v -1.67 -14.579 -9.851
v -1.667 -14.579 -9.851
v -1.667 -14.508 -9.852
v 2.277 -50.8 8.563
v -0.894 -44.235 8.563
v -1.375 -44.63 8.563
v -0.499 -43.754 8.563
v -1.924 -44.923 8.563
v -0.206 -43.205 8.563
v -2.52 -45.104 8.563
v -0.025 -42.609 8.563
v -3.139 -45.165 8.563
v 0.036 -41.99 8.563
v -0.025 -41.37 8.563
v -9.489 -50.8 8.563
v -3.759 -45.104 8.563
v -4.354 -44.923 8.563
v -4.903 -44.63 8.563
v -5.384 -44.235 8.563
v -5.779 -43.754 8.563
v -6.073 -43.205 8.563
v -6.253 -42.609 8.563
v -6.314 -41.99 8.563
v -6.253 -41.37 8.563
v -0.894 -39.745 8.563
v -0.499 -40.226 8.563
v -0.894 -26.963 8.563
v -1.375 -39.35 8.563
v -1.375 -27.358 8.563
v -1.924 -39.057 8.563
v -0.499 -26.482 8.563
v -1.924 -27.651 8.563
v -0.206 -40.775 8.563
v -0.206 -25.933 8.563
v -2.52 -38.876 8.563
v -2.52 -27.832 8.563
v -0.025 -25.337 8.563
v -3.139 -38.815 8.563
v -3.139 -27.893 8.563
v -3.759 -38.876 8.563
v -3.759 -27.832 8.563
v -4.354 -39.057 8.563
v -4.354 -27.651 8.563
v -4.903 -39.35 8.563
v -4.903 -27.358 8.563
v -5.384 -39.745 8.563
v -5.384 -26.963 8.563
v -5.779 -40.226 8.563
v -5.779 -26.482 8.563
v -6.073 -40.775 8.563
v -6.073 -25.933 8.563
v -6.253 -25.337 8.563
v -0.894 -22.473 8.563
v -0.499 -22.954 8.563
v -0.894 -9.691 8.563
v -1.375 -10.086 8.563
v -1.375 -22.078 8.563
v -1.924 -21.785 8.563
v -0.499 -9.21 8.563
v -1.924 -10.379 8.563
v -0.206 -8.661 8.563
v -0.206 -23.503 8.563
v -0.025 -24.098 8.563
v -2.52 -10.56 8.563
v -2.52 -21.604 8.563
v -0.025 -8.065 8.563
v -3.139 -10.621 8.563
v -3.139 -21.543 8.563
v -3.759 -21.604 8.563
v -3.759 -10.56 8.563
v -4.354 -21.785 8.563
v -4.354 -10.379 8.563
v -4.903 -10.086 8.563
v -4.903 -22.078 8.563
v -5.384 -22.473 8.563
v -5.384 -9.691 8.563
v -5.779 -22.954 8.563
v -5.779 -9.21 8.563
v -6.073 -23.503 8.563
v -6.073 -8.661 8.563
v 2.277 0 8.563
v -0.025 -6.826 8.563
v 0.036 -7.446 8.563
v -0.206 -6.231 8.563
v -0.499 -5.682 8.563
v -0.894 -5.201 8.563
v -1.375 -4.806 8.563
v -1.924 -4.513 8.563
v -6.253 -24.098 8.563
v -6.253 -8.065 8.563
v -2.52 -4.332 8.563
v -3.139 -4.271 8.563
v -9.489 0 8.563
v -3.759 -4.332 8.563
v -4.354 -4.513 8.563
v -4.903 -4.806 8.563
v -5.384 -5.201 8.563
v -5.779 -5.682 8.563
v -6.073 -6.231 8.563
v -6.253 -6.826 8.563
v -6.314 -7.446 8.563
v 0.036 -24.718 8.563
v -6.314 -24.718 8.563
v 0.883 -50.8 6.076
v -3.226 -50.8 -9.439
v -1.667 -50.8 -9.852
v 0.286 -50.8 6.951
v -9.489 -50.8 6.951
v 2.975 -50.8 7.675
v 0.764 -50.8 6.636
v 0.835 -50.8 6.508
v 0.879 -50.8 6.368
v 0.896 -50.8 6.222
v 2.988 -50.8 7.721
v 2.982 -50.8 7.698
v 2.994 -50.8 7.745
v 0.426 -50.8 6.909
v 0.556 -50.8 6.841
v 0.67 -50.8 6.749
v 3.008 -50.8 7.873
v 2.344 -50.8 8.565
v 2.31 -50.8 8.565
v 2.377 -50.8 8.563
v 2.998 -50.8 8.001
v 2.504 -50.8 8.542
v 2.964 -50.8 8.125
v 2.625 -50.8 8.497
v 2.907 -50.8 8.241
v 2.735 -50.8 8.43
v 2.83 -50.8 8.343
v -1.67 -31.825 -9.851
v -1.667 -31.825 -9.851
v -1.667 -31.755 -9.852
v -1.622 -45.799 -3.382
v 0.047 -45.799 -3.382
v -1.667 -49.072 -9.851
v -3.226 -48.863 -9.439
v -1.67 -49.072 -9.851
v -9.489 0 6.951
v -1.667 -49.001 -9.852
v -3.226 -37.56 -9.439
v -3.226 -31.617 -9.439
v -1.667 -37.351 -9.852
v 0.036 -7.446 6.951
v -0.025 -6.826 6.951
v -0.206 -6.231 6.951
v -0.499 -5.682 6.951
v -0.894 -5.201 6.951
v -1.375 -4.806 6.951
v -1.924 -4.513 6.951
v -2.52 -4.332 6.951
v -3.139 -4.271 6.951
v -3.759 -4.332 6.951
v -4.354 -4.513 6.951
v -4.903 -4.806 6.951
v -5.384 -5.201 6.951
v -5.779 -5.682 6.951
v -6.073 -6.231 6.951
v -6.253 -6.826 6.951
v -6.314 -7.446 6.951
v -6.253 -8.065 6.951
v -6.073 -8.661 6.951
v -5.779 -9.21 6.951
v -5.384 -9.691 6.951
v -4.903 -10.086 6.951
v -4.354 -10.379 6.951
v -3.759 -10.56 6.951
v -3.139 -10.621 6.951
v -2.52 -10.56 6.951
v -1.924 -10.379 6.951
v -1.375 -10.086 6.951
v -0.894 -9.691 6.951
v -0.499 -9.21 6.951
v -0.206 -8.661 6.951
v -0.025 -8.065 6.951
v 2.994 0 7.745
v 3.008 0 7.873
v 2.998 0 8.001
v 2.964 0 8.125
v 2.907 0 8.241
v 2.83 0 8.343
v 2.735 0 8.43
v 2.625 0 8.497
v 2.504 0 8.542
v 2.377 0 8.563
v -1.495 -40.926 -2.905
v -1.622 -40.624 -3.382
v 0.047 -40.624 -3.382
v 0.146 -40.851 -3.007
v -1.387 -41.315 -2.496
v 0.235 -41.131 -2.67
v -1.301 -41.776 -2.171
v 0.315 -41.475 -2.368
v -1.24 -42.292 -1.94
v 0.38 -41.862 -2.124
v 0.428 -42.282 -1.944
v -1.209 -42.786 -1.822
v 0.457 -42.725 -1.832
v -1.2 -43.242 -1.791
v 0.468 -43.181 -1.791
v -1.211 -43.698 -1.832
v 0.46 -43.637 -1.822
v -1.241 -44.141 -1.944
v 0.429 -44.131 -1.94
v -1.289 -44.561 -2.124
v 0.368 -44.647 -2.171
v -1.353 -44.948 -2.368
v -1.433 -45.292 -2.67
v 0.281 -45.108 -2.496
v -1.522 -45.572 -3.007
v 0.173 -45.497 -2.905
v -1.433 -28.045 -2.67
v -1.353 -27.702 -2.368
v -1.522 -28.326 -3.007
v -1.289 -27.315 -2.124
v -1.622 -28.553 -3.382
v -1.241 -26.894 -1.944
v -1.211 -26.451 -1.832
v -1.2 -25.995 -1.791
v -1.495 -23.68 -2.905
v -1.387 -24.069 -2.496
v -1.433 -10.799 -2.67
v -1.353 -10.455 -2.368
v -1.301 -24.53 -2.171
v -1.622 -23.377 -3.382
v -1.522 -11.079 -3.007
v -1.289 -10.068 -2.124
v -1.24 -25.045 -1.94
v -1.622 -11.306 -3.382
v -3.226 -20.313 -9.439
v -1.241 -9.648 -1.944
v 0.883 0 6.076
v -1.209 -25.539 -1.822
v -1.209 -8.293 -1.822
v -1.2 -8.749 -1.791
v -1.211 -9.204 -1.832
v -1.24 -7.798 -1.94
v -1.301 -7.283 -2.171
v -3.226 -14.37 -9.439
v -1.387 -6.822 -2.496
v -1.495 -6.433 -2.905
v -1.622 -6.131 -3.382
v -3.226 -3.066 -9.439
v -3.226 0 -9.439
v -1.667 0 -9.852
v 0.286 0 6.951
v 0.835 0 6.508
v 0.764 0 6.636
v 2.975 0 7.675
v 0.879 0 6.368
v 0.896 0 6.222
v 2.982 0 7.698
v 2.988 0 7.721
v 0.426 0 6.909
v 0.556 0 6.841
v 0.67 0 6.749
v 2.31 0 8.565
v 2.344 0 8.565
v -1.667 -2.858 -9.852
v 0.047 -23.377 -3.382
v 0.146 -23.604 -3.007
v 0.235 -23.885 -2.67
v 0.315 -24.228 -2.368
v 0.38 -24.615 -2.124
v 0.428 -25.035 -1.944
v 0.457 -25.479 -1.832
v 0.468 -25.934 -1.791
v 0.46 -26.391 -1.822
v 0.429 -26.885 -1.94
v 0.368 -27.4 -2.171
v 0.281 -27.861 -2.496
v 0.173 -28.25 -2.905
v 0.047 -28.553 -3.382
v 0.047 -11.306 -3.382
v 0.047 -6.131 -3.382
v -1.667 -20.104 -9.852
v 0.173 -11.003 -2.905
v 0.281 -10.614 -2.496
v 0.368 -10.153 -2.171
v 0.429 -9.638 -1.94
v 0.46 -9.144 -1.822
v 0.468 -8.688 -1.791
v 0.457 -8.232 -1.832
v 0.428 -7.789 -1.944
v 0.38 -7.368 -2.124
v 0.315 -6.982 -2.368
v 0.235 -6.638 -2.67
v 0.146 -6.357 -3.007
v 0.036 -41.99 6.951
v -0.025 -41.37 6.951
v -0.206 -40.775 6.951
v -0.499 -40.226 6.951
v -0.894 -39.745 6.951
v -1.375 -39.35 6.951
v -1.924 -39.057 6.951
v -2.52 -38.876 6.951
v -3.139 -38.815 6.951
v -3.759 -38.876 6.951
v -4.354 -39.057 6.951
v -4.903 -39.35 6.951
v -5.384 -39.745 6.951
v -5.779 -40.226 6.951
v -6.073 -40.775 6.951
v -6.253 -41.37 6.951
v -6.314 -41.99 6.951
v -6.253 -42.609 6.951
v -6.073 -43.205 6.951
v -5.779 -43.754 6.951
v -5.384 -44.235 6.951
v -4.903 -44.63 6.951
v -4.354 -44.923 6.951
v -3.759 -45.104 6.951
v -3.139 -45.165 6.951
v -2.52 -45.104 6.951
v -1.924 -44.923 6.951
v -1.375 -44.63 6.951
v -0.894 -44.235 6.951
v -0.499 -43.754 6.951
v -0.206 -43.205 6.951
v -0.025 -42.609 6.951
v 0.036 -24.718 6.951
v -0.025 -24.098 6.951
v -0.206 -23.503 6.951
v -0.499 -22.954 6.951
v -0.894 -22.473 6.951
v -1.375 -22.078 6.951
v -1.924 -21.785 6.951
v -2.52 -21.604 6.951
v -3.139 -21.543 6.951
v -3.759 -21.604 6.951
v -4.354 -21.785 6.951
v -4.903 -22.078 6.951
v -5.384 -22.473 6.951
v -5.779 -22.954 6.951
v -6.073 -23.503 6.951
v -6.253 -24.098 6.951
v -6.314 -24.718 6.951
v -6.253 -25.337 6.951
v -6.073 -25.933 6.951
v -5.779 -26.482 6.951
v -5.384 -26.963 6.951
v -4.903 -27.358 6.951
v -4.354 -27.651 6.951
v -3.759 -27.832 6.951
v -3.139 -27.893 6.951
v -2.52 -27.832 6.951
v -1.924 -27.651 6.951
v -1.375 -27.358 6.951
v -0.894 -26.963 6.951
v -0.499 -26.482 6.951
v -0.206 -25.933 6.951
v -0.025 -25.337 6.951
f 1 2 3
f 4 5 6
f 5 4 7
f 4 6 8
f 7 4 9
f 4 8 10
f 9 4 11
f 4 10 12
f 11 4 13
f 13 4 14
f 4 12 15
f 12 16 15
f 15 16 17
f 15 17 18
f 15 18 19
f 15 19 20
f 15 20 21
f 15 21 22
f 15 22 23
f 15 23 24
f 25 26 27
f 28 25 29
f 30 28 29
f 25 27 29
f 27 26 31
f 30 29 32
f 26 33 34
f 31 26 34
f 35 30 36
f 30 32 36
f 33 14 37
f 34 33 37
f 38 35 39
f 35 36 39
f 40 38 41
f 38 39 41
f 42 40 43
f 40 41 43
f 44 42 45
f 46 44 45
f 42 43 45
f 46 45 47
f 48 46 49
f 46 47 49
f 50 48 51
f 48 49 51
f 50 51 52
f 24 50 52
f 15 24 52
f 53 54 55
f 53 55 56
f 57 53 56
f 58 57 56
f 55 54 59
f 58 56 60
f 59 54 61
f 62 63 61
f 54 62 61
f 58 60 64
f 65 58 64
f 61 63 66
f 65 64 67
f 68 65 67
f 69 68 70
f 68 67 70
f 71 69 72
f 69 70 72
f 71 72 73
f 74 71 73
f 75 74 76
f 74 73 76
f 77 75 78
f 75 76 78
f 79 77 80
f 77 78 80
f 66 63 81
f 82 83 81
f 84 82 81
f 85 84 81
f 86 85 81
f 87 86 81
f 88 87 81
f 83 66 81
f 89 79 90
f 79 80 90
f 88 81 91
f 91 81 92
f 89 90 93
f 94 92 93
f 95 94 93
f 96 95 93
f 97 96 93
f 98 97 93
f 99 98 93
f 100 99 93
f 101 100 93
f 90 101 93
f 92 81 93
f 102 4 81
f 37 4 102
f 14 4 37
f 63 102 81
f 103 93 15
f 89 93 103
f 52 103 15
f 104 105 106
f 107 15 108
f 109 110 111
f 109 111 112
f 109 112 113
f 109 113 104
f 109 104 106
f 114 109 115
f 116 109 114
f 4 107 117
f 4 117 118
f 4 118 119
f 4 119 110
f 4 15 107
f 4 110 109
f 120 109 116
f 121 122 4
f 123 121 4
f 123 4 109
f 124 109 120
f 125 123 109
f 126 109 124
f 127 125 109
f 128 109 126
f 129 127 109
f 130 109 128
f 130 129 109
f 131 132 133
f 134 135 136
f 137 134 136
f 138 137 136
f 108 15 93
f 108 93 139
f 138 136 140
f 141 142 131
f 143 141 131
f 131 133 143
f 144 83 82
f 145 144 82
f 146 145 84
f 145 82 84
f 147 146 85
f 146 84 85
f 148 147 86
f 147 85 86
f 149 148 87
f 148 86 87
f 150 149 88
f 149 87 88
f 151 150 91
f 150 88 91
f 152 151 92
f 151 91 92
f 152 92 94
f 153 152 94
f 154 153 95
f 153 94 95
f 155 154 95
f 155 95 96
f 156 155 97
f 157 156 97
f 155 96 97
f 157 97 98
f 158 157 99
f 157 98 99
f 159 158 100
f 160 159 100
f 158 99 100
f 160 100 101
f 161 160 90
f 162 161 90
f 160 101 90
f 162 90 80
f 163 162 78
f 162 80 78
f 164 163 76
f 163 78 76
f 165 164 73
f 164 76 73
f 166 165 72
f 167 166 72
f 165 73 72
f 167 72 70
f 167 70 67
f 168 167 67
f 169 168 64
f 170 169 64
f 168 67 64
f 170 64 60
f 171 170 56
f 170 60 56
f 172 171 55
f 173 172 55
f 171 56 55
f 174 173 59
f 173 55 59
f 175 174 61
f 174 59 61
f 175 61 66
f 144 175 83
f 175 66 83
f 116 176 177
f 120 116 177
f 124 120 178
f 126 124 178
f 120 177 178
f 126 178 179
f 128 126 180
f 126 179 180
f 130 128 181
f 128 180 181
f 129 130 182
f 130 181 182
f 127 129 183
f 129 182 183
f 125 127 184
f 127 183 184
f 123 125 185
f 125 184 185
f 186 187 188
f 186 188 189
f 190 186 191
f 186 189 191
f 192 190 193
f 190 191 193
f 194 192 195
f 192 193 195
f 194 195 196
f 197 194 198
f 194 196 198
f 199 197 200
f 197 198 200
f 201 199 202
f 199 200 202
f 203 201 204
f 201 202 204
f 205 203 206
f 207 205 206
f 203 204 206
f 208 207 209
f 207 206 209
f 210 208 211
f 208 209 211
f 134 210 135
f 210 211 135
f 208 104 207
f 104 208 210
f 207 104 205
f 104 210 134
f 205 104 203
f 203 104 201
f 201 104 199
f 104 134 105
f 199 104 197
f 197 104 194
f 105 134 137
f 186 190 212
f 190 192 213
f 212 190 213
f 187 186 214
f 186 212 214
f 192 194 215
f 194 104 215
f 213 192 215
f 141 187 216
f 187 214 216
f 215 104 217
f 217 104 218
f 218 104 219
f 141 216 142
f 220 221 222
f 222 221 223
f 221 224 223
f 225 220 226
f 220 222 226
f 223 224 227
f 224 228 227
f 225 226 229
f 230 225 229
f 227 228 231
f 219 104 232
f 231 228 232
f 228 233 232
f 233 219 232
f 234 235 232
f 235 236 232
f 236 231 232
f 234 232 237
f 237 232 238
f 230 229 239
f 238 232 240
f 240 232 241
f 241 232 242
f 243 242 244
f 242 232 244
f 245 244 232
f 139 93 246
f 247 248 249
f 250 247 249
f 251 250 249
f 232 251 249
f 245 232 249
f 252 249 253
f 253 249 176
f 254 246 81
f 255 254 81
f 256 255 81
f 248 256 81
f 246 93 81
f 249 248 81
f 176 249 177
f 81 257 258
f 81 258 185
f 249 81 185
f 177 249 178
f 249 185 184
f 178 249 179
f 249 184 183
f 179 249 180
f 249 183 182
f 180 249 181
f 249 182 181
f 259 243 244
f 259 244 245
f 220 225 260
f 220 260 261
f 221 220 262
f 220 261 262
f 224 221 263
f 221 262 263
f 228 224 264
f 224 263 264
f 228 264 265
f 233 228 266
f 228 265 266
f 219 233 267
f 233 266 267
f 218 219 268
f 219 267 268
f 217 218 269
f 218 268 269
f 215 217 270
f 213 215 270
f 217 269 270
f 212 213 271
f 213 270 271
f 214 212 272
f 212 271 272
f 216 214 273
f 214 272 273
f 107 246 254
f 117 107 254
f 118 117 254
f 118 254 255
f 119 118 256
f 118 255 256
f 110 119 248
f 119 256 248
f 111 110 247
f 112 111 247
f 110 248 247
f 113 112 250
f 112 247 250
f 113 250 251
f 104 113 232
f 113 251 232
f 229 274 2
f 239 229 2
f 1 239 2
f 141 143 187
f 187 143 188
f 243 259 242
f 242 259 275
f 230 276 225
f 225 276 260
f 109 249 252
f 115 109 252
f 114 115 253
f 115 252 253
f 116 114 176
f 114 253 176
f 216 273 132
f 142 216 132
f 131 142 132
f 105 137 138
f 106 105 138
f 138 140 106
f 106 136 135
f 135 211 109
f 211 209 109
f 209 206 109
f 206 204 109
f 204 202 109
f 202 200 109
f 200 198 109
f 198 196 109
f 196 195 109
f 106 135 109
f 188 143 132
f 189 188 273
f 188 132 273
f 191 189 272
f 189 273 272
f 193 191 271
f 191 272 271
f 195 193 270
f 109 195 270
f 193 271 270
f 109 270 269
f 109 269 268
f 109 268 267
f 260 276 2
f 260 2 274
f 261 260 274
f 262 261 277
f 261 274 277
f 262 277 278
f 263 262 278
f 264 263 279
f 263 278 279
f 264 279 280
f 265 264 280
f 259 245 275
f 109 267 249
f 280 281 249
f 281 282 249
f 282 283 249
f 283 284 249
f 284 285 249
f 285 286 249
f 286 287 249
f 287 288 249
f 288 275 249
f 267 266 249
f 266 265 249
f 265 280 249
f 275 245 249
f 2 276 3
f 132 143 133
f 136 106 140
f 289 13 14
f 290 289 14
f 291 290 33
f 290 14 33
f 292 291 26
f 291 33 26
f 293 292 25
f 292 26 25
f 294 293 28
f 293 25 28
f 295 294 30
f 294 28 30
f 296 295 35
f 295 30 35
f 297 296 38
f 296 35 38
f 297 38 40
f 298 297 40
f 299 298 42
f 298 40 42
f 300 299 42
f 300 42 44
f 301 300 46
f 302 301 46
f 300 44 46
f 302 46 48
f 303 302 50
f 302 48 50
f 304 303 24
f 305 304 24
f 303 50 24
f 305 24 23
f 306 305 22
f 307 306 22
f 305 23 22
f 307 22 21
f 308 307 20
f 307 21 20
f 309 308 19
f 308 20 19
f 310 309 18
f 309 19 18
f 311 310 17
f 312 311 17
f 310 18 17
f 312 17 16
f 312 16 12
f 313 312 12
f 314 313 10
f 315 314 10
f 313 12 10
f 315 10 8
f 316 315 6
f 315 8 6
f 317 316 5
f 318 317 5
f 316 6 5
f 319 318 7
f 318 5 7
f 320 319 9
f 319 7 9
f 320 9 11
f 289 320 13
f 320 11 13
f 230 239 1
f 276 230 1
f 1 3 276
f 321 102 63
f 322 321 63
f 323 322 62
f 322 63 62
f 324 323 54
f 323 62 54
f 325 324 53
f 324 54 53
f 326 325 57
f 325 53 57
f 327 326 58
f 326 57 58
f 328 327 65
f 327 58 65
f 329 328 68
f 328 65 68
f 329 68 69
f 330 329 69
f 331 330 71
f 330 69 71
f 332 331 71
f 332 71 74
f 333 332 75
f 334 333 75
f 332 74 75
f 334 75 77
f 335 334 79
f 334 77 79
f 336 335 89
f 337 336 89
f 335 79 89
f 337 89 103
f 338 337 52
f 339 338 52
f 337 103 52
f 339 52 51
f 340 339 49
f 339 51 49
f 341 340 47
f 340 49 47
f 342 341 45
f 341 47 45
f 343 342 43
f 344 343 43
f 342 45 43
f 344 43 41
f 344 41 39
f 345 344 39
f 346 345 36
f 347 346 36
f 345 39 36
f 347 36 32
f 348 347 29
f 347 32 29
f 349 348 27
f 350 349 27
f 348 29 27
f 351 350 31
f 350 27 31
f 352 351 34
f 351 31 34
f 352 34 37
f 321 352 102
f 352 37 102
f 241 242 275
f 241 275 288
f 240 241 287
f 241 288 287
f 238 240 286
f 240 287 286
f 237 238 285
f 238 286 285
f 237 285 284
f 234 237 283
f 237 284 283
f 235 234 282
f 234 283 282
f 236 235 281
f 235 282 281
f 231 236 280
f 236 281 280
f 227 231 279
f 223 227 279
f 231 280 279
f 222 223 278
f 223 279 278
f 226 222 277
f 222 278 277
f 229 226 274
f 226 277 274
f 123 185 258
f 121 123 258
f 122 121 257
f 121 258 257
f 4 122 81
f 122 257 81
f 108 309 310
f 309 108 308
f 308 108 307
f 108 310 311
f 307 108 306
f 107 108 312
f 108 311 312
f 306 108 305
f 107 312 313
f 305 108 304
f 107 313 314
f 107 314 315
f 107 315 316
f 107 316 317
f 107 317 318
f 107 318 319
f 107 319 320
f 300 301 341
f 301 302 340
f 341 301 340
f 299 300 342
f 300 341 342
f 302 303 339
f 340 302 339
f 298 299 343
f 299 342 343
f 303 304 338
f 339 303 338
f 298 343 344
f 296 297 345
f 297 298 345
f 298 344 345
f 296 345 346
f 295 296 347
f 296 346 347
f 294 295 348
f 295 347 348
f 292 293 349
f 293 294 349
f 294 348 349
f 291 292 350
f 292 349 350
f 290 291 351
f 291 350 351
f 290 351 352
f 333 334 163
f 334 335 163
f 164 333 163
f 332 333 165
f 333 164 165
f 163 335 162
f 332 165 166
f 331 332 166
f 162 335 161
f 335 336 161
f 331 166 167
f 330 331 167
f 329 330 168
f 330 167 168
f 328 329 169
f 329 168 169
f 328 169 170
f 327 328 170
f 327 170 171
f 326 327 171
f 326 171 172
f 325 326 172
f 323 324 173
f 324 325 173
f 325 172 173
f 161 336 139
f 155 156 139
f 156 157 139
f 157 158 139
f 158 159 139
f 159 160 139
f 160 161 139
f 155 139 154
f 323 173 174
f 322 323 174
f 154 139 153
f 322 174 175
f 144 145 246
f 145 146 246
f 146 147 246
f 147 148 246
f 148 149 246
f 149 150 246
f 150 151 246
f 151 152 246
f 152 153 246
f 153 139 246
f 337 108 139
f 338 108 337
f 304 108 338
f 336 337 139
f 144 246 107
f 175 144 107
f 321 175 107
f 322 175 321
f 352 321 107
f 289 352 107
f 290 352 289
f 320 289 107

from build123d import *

# Parameters (mm, degrees)
F1_DEPTH      = 50.8
F3_DEPTH      = 25.4
F3_DEPTH_BACK = 25.4
F4_R          = 3.175
F5_DEPTH      = 1.6129


with BuildPart() as f1:
    # F0 (on Front) → F1 (new body)
    with BuildSketch(Plane.XZ):
        with BuildLine():
            Line((2.2765197791, 8.5634865664), (-9.489294471, 8.5634865664))
            Line((-9.489294471, 8.5634865664), (-9.489294471, 6.9505865664))
            Line((-9.489294471, 6.9505865664), (0, 6.9505865664))
            ThreePointArc((0, 6.9505865664), (0.1429068283, 6.9642762789), (0.2858136566, 6.9505865664))
            ThreePointArc((0.2858136566, 6.9505865664), (0.7644025503, 6.6362301957), (0.8833758177, 6.0761296524))
            Line((0.8833758177, 6.0761296524), (-3.2259208163, -9.4385629753))
            Line((-3.2259208163, -9.4385629753), (-1.6667832808, -9.8515236945))
            Line((-1.6667832808, -9.8515236945), (2.9753029463, 7.6747216416))
            Line((2.9753029463, 7.6747216416), (2.993829025, 7.7446670463))
            ThreePointArc((2.993829025, 7.7446670463), (2.8710717472, 8.2939064661), (2.3770475991, 8.5634865664))
            Line((2.3770475991, 8.5634865664), (2.2765197791, 8.5634865664))
        make_face()
        with BuildLine():
            ThreePointArc((2.3770475991, 8.5634865664), (2.3267836891, 8.5653429014), (2.2765197791, 8.5634865664))
            Line((2.2765197791, 8.5634865664), (2.3770475991, 8.5634865664))
        make_face()
        with BuildLine():
            ThreePointArc((0.2858136566, 6.9505865664), (0.1429068283, 6.9642762789), (0, 6.9505865664))
            Line((0, 6.9505865664), (0.2858136566, 6.9505865664))
        make_face()
        with BuildLine():
            ThreePointArc((2.9753029463, 7.6747216416), (2.9854950368, 7.709448271), (2.993829025, 7.7446670463))
            Line((2.993829025, 7.7446670463), (2.9753029463, 7.6747216416))
        make_face()
    extrude(amount=F1_DEPTH)

    # F2 (on Right) → F3 (cut, two sides)
    with BuildSketch(Plane.YZ) as f3_sk:
        with BuildLine():
            Line((-45.7992069423, -3.3815500792), (-49.0718819201, -9.8507925868))
            Line((-49.0718819201, -9.8507925868), (-37.2894648818, -9.9727063475))
            Line((-37.2894648818, -9.9727063475), (-40.6238138676, -3.3815500792))
            ThreePointArc((-40.6238138676, -3.3815500792), (-43.2115104049, -1.7906479393), (-45.7992069423, -3.3815500792))
        make_face()
        with BuildLine():
            Line((-20.0428648818, -9.9727063475), (-23.3772138676, -3.3815500792))
            ThreePointArc((-23.3772138676, -3.3815500792), (-25.9649104049, -1.7906479393), (-28.5526069423, -3.3815500792))
            Line((-28.5526069423, -3.3815500792), (-31.8252819201, -9.8507925868))
            Line((-31.8252819201, -9.8507925868), (-20.0428648818, -9.9727063475))
        make_face()
        with BuildLine():
            Line((-2.7962648818, -9.9727063475), (-6.1306138676, -3.3815500792))
            ThreePointArc((-6.1306138676, -3.3815500792), (-8.7183104049, -1.7906479393), (-11.3060069423, -3.3815500792))
            Line((-11.3060069423, -3.3815500792), (-14.5786819201, -9.8507925868))
            Line((-14.5786819201, -9.8507925868), (-2.7962648818, -9.9727063475))
        make_face()
    extrude(amount=-F3_DEPTH, mode=Mode.SUBTRACT)
    extrude(f3_sk.sketch, amount=F3_DEPTH_BACK, mode=Mode.SUBTRACT)

    # F4 (on face) → F5 (cut, through all)
    with BuildSketch(Plane.XY.offset(8.5634865664)):
        with Locations((-3.139294471, -7.4458811432)):
            Circle(F4_R)
        with Locations((-3.139294471, -24.7178811432)):
            Circle(F4_R)
        with Locations((-3.139294471, -41.9898811432)):
            Circle(F4_R)
    extrude(amount=-F5_DEPTH, mode=Mode.SUBTRACT)


solid = f1.part
